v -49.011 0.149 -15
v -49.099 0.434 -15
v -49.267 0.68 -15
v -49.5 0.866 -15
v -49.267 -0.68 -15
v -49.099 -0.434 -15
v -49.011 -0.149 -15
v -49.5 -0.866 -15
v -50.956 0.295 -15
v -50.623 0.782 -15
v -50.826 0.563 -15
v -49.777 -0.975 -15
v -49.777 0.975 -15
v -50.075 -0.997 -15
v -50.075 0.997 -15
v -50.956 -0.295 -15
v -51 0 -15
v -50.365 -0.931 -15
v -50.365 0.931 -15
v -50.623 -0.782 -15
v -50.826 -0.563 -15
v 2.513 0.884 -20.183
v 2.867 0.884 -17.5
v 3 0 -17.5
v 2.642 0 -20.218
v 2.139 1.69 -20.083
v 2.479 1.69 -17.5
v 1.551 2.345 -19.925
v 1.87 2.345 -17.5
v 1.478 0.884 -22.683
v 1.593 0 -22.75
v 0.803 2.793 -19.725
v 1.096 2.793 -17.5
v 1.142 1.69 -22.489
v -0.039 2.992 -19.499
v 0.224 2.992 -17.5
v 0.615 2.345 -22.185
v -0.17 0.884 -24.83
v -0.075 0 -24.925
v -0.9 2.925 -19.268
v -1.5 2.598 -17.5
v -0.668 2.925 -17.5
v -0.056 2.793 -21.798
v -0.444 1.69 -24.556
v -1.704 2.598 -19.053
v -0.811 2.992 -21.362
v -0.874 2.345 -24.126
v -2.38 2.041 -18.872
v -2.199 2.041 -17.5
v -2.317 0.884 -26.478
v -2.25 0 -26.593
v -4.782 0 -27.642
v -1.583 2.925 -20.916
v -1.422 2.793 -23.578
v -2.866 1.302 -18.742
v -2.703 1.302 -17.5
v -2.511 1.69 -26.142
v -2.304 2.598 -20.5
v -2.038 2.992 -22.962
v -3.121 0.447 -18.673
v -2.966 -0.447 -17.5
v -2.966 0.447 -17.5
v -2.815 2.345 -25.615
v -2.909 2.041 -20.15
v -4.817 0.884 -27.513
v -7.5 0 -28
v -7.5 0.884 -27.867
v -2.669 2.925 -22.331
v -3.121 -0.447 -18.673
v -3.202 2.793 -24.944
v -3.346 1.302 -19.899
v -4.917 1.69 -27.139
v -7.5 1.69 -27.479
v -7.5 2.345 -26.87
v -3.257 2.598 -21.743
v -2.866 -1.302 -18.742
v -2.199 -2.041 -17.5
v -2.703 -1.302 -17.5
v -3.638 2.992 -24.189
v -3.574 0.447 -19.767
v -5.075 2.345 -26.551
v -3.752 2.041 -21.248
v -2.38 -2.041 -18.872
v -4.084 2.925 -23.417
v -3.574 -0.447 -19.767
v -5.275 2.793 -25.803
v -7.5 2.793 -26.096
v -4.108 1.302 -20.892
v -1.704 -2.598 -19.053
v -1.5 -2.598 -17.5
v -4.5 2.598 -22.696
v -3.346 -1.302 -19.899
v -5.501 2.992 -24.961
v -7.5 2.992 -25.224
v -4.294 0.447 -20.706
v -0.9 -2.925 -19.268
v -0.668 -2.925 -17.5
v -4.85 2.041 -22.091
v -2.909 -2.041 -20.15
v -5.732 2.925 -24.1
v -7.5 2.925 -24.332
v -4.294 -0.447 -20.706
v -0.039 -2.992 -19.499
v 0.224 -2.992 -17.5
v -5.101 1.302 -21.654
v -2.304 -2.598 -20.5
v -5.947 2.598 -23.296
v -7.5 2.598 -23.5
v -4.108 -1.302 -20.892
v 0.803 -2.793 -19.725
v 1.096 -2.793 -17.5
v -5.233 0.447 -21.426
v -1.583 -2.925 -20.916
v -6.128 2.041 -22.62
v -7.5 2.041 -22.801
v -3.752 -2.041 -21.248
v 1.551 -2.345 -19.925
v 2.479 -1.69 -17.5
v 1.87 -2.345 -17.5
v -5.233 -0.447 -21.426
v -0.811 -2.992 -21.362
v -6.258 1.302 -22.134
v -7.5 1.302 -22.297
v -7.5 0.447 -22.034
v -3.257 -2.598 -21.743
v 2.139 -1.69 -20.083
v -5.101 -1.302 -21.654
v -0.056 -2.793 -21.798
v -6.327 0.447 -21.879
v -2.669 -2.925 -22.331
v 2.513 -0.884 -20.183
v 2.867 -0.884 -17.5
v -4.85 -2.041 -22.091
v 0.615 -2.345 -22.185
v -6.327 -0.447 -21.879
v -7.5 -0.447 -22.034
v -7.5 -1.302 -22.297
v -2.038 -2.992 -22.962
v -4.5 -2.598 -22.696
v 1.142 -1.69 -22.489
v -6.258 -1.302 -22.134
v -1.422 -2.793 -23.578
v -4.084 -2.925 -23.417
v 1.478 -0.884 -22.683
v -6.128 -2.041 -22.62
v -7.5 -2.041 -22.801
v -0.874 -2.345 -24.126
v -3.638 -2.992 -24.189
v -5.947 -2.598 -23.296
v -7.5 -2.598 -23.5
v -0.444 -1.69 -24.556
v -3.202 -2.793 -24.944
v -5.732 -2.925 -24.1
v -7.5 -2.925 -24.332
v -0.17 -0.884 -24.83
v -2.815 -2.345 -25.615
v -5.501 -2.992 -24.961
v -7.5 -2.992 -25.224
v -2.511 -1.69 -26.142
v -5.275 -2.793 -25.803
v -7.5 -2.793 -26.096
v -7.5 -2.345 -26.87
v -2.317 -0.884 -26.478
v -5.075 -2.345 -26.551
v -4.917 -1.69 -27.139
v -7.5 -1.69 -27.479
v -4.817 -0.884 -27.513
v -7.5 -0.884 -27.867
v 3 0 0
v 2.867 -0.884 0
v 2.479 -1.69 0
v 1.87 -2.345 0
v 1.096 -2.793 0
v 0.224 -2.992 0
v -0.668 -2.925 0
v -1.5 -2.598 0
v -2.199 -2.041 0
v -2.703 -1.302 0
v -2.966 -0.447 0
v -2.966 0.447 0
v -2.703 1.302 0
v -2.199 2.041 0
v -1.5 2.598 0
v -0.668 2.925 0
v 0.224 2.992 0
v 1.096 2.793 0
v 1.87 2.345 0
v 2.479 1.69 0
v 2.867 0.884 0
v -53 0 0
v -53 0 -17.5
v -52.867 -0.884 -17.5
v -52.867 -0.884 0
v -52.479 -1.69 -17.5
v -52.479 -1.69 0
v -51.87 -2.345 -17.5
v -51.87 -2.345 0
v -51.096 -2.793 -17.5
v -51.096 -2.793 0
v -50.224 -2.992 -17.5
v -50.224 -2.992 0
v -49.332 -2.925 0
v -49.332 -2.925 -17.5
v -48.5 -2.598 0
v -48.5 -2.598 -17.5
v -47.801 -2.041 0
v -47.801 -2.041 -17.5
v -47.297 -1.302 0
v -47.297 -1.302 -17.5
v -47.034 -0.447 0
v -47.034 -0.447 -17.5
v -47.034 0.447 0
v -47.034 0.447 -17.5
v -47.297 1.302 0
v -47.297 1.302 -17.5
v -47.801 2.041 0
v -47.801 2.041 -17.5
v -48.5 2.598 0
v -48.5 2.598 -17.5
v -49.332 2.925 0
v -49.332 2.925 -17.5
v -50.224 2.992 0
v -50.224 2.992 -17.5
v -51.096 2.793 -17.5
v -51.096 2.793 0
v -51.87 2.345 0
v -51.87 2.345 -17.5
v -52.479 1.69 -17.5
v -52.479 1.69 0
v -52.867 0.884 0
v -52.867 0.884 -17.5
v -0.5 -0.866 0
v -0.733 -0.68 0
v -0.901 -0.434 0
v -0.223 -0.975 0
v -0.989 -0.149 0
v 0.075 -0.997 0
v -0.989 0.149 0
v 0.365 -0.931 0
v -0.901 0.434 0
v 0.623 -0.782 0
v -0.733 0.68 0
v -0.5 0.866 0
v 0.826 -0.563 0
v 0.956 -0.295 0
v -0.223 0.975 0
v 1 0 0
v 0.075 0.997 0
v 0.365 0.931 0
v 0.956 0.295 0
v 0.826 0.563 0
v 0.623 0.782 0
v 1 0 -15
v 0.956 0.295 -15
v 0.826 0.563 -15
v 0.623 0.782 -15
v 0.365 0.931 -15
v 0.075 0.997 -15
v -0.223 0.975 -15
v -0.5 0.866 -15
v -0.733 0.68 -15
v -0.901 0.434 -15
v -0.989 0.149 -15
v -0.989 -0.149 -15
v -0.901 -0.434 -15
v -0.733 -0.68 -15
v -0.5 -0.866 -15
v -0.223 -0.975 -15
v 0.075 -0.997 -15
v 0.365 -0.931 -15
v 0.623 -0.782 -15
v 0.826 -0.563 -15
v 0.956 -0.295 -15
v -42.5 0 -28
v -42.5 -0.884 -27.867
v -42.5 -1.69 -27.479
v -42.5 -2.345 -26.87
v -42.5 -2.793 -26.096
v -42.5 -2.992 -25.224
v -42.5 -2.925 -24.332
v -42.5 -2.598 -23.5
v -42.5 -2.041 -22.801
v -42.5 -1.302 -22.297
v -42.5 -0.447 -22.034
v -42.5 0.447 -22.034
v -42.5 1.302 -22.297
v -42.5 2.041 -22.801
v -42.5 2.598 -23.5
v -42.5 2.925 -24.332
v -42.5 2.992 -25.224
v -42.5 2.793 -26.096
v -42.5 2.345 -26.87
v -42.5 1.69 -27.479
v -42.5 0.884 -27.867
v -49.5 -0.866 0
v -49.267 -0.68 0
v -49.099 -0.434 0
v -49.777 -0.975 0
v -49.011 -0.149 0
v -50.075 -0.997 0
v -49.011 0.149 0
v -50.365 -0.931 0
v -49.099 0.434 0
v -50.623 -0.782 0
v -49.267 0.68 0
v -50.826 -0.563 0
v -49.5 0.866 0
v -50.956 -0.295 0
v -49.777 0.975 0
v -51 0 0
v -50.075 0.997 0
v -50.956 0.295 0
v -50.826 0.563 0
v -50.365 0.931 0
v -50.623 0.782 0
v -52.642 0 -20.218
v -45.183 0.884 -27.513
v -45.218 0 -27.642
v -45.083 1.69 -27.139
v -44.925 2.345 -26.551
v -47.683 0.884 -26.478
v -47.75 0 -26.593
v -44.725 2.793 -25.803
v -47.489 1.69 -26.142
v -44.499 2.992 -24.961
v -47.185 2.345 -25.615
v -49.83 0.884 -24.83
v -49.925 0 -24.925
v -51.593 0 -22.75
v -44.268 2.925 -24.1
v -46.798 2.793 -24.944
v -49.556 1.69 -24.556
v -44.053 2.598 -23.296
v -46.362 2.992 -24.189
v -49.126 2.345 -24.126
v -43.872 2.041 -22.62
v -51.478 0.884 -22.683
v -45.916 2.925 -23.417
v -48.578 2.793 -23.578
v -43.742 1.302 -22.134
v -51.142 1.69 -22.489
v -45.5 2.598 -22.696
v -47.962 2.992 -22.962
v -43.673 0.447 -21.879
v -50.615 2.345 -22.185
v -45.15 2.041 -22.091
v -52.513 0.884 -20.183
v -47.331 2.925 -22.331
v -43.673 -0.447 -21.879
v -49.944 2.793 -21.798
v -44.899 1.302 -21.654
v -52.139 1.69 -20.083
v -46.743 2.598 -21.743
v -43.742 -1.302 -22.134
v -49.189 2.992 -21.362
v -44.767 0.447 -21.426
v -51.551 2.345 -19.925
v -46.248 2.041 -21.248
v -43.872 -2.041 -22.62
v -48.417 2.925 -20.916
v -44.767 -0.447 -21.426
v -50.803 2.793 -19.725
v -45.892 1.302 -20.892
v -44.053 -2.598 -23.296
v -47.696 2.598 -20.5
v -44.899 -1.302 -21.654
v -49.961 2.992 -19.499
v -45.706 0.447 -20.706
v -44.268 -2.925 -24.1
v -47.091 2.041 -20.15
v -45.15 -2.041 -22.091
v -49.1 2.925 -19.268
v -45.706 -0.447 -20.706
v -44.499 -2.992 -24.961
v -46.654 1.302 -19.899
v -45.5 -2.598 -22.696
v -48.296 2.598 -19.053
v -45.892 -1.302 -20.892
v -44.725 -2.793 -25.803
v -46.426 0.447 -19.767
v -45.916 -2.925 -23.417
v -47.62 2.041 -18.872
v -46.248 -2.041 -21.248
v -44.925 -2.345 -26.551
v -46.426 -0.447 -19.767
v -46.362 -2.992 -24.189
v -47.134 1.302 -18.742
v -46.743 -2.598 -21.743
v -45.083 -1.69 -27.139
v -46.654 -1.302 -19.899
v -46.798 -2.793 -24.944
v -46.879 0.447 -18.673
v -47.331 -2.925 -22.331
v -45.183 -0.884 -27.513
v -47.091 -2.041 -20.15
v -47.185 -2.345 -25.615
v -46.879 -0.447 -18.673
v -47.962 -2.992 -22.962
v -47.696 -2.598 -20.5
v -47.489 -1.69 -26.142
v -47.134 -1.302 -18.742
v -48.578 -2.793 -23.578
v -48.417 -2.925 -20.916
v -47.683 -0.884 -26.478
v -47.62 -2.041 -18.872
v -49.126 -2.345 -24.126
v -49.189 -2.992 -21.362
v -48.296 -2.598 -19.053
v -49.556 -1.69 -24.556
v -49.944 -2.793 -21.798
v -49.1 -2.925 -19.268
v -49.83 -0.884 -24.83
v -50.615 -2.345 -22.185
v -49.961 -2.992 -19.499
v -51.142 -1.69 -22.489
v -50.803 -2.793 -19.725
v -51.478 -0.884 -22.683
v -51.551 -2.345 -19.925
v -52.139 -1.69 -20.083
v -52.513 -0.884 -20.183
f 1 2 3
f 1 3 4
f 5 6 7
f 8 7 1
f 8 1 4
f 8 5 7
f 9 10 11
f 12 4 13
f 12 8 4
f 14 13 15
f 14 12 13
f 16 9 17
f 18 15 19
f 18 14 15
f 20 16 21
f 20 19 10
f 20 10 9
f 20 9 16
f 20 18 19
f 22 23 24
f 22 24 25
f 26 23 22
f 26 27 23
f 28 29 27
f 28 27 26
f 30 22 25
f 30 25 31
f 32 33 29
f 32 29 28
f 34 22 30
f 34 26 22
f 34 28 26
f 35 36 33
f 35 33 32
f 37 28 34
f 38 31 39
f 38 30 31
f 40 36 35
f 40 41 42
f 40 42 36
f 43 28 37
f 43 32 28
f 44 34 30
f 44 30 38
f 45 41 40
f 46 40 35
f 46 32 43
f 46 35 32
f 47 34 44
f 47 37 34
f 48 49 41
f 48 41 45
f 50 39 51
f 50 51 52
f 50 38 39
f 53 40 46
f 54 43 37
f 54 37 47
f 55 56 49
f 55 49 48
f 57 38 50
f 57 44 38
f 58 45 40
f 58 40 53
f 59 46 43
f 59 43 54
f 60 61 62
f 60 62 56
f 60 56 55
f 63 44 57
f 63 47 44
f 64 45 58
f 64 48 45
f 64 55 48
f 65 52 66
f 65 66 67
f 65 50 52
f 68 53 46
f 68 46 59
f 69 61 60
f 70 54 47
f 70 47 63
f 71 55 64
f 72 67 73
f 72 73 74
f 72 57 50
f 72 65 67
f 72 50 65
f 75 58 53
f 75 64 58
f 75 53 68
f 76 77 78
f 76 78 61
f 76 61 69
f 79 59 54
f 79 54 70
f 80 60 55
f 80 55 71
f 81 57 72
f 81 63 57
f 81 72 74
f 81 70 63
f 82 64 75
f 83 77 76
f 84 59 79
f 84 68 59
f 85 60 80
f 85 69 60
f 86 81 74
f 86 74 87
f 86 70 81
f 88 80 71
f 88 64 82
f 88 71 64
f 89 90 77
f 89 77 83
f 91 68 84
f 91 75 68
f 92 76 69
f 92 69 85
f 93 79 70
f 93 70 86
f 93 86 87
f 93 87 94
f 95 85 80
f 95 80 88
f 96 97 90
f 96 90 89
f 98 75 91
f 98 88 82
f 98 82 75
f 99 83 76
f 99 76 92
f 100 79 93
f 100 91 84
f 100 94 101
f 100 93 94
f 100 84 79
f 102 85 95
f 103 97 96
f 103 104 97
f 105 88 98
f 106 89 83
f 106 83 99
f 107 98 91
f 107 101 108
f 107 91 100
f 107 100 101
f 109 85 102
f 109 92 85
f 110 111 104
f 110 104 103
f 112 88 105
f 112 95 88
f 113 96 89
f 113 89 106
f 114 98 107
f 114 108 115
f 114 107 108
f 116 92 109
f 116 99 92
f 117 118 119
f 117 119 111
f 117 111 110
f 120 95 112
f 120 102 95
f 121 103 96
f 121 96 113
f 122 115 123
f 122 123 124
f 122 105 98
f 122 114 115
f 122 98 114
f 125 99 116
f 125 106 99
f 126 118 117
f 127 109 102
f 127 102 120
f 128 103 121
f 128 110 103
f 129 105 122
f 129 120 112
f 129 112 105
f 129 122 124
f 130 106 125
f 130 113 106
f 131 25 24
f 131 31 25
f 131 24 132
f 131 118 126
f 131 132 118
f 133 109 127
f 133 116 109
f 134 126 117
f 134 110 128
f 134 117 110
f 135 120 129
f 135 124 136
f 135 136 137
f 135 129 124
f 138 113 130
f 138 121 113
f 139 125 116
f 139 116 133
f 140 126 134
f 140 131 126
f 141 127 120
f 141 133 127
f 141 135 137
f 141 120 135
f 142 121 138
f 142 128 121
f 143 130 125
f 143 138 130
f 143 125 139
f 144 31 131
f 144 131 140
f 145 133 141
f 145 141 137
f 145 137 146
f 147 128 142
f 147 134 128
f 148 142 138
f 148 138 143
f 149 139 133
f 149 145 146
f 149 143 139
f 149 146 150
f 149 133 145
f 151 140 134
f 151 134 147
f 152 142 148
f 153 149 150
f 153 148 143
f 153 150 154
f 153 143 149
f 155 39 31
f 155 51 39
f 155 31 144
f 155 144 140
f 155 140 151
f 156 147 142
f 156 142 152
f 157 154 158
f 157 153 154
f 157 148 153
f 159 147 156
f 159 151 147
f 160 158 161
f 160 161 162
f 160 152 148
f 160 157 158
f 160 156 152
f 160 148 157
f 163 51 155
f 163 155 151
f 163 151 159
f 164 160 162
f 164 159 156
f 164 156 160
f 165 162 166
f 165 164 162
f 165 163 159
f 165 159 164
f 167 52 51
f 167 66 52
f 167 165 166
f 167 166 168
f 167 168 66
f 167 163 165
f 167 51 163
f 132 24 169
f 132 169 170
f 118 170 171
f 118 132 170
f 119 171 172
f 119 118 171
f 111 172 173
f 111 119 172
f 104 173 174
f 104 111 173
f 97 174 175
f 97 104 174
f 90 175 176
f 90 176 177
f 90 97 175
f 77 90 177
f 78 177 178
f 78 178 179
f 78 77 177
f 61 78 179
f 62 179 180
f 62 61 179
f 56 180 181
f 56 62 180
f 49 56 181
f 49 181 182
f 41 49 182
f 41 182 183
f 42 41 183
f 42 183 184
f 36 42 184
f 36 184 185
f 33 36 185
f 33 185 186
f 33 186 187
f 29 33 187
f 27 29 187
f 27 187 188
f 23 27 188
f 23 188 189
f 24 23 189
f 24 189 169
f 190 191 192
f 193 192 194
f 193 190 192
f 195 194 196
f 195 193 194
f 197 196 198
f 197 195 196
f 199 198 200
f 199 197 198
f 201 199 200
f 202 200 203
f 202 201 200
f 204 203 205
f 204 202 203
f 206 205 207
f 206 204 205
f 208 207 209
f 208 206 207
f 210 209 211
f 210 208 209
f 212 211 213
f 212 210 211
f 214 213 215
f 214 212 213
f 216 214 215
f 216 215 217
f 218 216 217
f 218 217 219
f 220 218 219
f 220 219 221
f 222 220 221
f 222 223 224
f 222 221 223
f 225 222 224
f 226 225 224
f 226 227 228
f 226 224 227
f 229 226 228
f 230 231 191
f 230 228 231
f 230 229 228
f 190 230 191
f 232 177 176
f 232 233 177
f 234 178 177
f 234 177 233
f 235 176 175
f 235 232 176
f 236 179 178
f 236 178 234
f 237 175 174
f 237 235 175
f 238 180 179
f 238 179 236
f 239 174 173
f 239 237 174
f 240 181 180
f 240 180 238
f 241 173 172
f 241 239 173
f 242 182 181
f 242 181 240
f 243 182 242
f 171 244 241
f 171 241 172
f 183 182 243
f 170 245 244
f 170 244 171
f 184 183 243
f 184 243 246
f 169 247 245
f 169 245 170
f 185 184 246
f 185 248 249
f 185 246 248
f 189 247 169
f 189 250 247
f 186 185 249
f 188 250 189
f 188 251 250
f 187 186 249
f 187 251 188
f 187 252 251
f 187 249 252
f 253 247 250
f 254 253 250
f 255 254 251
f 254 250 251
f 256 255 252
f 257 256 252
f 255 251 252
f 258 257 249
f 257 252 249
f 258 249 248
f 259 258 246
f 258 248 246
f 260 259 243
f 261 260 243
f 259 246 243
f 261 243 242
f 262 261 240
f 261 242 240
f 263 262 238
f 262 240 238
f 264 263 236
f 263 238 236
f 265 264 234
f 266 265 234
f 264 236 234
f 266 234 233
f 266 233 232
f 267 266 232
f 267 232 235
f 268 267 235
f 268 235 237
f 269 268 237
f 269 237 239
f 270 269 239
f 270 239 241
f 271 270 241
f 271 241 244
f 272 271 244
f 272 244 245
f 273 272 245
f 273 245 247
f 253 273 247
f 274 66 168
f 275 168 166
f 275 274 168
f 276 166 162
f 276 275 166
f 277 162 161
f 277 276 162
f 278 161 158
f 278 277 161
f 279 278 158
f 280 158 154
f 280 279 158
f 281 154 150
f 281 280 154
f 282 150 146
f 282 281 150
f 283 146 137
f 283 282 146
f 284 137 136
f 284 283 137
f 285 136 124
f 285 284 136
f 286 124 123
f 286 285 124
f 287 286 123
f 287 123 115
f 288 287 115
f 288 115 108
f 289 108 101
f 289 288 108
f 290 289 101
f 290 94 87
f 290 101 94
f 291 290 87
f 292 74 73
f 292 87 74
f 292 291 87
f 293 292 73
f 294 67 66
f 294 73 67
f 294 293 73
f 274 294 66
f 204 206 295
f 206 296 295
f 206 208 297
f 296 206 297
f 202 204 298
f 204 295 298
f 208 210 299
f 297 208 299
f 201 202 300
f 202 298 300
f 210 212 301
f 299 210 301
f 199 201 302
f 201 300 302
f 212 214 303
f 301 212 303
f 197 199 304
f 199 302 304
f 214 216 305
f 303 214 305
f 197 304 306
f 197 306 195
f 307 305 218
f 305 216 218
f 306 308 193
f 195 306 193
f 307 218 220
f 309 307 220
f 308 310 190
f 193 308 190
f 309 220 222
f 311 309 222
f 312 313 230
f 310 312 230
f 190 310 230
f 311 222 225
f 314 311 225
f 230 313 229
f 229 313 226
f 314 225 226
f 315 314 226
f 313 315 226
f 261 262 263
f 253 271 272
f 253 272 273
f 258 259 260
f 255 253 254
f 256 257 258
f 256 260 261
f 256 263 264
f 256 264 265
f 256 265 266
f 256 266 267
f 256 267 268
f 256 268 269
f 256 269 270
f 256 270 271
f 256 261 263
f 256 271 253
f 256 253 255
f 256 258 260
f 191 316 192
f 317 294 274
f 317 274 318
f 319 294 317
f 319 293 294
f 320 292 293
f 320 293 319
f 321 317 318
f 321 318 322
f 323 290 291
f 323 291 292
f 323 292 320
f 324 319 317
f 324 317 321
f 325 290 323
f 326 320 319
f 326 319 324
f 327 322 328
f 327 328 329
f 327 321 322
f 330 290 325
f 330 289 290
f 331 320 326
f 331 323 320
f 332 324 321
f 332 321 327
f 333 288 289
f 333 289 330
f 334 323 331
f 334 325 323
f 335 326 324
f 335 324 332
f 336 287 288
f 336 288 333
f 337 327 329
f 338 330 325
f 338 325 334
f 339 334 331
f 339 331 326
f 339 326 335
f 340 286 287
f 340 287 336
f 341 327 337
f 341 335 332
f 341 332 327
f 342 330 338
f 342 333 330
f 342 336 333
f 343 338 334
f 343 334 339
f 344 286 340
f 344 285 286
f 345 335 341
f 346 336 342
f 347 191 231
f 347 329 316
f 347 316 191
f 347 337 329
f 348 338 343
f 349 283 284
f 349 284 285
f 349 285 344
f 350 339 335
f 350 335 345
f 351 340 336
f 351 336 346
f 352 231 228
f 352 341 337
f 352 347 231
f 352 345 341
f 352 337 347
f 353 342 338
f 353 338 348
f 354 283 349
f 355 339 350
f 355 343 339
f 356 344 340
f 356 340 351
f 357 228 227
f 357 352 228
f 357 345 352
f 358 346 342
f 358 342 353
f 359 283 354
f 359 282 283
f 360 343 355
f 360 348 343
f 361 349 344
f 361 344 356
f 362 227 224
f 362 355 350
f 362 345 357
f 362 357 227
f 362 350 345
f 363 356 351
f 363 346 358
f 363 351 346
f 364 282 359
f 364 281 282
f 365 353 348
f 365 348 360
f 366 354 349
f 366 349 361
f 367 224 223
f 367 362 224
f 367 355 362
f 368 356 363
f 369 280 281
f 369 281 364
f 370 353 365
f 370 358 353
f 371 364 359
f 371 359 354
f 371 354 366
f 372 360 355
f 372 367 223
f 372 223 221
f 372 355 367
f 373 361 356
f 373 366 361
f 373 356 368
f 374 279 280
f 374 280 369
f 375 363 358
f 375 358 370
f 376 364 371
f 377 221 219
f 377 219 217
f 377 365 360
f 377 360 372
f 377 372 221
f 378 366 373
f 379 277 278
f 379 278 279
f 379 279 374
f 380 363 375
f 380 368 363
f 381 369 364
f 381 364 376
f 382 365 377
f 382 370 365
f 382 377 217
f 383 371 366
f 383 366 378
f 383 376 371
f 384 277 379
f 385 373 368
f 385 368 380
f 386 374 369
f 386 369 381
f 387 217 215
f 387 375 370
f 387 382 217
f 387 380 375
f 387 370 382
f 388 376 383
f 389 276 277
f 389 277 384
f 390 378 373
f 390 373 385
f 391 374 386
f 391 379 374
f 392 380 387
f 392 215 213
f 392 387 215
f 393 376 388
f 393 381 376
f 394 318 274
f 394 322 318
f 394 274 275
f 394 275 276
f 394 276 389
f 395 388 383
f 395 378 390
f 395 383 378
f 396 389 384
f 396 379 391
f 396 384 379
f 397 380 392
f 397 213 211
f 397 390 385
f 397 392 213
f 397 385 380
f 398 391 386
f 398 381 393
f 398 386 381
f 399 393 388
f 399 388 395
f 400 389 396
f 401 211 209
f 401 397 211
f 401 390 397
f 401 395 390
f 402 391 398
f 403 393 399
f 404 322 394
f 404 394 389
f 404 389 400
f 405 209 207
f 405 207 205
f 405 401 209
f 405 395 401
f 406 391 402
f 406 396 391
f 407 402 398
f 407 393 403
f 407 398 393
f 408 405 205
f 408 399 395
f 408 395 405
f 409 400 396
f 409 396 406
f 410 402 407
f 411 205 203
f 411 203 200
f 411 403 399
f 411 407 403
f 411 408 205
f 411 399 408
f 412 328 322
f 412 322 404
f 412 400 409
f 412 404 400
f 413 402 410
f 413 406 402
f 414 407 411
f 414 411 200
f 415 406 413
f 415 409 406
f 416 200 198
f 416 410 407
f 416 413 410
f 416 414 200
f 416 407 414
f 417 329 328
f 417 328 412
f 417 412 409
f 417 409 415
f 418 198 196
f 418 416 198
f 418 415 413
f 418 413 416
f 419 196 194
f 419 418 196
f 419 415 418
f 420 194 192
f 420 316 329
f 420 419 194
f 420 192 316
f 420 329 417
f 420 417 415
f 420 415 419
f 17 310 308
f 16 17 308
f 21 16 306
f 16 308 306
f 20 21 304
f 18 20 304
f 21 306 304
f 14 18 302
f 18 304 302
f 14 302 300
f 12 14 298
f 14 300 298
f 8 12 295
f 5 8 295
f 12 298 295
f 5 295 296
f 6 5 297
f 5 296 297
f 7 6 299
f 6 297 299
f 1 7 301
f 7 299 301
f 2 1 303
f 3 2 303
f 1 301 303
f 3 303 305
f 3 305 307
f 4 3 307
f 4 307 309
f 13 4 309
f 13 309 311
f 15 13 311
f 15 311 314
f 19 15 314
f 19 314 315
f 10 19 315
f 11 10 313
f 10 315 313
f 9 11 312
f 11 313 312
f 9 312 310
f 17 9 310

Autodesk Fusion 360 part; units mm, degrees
sketch "Sketch1" plane through (0, 0, 0) normal (0, 0, 1) x (1, 0, 0)
sketch "Sketch2" plane through (0, 0, 0) normal (0, 0, 1) x (1, 0, 0)
  circle A0 centre (0, 0) radius 3
  dimension "d1" = 6
sketch "Sketch3" plane through (0, 0, 0) normal (0, 1, 0) x (1, 0, 0)
  line L0 (0, 0) -> (0, 17.5)
  line L1 (-7.5, 25) -> (-42.5, 25)
  line L2 (-50, 17.5) -> (-50, 0)
  arc A0 (0, 17.5) -> (-7.5, 25) centre (-7.5, 17.5) ccw
  arc A1 (-42.5, 25) -> (-50, 17.5) centre (-42.5, 17.5) ccw
  point P0 (0, 25)
  point P1 (-50, 25)
  dimension "d2" = 25
  dimension "d4" = 7.5
  dimension "d5" = 7.5
sweep "Sweep1" add profiles "Sketch2" path "Sketch3" along L0 A0 L1 A1 L2 section 1
sketch "Sketch4" plane through (0, 0, 0) normal (0, 0, 1) x (1, 0, 0)
  circle A0 centre (0, 0) radius 1
  dimension "d12" = 2
extrude "Extrude1" cut sketch "Sketch4" against normal blind 15
sketch "Sketch5" plane through (0, 0, 0) normal (0, 0, 1) x (-1, 0, 0)
  circle A0 centre (50, 0) radius 3
  circle A1 centre (50, 0) radius 1
  dimension "d15" = 2
extrude "Extrude2" cut sketch "Sketch5" against normal blind 15 contours A1
